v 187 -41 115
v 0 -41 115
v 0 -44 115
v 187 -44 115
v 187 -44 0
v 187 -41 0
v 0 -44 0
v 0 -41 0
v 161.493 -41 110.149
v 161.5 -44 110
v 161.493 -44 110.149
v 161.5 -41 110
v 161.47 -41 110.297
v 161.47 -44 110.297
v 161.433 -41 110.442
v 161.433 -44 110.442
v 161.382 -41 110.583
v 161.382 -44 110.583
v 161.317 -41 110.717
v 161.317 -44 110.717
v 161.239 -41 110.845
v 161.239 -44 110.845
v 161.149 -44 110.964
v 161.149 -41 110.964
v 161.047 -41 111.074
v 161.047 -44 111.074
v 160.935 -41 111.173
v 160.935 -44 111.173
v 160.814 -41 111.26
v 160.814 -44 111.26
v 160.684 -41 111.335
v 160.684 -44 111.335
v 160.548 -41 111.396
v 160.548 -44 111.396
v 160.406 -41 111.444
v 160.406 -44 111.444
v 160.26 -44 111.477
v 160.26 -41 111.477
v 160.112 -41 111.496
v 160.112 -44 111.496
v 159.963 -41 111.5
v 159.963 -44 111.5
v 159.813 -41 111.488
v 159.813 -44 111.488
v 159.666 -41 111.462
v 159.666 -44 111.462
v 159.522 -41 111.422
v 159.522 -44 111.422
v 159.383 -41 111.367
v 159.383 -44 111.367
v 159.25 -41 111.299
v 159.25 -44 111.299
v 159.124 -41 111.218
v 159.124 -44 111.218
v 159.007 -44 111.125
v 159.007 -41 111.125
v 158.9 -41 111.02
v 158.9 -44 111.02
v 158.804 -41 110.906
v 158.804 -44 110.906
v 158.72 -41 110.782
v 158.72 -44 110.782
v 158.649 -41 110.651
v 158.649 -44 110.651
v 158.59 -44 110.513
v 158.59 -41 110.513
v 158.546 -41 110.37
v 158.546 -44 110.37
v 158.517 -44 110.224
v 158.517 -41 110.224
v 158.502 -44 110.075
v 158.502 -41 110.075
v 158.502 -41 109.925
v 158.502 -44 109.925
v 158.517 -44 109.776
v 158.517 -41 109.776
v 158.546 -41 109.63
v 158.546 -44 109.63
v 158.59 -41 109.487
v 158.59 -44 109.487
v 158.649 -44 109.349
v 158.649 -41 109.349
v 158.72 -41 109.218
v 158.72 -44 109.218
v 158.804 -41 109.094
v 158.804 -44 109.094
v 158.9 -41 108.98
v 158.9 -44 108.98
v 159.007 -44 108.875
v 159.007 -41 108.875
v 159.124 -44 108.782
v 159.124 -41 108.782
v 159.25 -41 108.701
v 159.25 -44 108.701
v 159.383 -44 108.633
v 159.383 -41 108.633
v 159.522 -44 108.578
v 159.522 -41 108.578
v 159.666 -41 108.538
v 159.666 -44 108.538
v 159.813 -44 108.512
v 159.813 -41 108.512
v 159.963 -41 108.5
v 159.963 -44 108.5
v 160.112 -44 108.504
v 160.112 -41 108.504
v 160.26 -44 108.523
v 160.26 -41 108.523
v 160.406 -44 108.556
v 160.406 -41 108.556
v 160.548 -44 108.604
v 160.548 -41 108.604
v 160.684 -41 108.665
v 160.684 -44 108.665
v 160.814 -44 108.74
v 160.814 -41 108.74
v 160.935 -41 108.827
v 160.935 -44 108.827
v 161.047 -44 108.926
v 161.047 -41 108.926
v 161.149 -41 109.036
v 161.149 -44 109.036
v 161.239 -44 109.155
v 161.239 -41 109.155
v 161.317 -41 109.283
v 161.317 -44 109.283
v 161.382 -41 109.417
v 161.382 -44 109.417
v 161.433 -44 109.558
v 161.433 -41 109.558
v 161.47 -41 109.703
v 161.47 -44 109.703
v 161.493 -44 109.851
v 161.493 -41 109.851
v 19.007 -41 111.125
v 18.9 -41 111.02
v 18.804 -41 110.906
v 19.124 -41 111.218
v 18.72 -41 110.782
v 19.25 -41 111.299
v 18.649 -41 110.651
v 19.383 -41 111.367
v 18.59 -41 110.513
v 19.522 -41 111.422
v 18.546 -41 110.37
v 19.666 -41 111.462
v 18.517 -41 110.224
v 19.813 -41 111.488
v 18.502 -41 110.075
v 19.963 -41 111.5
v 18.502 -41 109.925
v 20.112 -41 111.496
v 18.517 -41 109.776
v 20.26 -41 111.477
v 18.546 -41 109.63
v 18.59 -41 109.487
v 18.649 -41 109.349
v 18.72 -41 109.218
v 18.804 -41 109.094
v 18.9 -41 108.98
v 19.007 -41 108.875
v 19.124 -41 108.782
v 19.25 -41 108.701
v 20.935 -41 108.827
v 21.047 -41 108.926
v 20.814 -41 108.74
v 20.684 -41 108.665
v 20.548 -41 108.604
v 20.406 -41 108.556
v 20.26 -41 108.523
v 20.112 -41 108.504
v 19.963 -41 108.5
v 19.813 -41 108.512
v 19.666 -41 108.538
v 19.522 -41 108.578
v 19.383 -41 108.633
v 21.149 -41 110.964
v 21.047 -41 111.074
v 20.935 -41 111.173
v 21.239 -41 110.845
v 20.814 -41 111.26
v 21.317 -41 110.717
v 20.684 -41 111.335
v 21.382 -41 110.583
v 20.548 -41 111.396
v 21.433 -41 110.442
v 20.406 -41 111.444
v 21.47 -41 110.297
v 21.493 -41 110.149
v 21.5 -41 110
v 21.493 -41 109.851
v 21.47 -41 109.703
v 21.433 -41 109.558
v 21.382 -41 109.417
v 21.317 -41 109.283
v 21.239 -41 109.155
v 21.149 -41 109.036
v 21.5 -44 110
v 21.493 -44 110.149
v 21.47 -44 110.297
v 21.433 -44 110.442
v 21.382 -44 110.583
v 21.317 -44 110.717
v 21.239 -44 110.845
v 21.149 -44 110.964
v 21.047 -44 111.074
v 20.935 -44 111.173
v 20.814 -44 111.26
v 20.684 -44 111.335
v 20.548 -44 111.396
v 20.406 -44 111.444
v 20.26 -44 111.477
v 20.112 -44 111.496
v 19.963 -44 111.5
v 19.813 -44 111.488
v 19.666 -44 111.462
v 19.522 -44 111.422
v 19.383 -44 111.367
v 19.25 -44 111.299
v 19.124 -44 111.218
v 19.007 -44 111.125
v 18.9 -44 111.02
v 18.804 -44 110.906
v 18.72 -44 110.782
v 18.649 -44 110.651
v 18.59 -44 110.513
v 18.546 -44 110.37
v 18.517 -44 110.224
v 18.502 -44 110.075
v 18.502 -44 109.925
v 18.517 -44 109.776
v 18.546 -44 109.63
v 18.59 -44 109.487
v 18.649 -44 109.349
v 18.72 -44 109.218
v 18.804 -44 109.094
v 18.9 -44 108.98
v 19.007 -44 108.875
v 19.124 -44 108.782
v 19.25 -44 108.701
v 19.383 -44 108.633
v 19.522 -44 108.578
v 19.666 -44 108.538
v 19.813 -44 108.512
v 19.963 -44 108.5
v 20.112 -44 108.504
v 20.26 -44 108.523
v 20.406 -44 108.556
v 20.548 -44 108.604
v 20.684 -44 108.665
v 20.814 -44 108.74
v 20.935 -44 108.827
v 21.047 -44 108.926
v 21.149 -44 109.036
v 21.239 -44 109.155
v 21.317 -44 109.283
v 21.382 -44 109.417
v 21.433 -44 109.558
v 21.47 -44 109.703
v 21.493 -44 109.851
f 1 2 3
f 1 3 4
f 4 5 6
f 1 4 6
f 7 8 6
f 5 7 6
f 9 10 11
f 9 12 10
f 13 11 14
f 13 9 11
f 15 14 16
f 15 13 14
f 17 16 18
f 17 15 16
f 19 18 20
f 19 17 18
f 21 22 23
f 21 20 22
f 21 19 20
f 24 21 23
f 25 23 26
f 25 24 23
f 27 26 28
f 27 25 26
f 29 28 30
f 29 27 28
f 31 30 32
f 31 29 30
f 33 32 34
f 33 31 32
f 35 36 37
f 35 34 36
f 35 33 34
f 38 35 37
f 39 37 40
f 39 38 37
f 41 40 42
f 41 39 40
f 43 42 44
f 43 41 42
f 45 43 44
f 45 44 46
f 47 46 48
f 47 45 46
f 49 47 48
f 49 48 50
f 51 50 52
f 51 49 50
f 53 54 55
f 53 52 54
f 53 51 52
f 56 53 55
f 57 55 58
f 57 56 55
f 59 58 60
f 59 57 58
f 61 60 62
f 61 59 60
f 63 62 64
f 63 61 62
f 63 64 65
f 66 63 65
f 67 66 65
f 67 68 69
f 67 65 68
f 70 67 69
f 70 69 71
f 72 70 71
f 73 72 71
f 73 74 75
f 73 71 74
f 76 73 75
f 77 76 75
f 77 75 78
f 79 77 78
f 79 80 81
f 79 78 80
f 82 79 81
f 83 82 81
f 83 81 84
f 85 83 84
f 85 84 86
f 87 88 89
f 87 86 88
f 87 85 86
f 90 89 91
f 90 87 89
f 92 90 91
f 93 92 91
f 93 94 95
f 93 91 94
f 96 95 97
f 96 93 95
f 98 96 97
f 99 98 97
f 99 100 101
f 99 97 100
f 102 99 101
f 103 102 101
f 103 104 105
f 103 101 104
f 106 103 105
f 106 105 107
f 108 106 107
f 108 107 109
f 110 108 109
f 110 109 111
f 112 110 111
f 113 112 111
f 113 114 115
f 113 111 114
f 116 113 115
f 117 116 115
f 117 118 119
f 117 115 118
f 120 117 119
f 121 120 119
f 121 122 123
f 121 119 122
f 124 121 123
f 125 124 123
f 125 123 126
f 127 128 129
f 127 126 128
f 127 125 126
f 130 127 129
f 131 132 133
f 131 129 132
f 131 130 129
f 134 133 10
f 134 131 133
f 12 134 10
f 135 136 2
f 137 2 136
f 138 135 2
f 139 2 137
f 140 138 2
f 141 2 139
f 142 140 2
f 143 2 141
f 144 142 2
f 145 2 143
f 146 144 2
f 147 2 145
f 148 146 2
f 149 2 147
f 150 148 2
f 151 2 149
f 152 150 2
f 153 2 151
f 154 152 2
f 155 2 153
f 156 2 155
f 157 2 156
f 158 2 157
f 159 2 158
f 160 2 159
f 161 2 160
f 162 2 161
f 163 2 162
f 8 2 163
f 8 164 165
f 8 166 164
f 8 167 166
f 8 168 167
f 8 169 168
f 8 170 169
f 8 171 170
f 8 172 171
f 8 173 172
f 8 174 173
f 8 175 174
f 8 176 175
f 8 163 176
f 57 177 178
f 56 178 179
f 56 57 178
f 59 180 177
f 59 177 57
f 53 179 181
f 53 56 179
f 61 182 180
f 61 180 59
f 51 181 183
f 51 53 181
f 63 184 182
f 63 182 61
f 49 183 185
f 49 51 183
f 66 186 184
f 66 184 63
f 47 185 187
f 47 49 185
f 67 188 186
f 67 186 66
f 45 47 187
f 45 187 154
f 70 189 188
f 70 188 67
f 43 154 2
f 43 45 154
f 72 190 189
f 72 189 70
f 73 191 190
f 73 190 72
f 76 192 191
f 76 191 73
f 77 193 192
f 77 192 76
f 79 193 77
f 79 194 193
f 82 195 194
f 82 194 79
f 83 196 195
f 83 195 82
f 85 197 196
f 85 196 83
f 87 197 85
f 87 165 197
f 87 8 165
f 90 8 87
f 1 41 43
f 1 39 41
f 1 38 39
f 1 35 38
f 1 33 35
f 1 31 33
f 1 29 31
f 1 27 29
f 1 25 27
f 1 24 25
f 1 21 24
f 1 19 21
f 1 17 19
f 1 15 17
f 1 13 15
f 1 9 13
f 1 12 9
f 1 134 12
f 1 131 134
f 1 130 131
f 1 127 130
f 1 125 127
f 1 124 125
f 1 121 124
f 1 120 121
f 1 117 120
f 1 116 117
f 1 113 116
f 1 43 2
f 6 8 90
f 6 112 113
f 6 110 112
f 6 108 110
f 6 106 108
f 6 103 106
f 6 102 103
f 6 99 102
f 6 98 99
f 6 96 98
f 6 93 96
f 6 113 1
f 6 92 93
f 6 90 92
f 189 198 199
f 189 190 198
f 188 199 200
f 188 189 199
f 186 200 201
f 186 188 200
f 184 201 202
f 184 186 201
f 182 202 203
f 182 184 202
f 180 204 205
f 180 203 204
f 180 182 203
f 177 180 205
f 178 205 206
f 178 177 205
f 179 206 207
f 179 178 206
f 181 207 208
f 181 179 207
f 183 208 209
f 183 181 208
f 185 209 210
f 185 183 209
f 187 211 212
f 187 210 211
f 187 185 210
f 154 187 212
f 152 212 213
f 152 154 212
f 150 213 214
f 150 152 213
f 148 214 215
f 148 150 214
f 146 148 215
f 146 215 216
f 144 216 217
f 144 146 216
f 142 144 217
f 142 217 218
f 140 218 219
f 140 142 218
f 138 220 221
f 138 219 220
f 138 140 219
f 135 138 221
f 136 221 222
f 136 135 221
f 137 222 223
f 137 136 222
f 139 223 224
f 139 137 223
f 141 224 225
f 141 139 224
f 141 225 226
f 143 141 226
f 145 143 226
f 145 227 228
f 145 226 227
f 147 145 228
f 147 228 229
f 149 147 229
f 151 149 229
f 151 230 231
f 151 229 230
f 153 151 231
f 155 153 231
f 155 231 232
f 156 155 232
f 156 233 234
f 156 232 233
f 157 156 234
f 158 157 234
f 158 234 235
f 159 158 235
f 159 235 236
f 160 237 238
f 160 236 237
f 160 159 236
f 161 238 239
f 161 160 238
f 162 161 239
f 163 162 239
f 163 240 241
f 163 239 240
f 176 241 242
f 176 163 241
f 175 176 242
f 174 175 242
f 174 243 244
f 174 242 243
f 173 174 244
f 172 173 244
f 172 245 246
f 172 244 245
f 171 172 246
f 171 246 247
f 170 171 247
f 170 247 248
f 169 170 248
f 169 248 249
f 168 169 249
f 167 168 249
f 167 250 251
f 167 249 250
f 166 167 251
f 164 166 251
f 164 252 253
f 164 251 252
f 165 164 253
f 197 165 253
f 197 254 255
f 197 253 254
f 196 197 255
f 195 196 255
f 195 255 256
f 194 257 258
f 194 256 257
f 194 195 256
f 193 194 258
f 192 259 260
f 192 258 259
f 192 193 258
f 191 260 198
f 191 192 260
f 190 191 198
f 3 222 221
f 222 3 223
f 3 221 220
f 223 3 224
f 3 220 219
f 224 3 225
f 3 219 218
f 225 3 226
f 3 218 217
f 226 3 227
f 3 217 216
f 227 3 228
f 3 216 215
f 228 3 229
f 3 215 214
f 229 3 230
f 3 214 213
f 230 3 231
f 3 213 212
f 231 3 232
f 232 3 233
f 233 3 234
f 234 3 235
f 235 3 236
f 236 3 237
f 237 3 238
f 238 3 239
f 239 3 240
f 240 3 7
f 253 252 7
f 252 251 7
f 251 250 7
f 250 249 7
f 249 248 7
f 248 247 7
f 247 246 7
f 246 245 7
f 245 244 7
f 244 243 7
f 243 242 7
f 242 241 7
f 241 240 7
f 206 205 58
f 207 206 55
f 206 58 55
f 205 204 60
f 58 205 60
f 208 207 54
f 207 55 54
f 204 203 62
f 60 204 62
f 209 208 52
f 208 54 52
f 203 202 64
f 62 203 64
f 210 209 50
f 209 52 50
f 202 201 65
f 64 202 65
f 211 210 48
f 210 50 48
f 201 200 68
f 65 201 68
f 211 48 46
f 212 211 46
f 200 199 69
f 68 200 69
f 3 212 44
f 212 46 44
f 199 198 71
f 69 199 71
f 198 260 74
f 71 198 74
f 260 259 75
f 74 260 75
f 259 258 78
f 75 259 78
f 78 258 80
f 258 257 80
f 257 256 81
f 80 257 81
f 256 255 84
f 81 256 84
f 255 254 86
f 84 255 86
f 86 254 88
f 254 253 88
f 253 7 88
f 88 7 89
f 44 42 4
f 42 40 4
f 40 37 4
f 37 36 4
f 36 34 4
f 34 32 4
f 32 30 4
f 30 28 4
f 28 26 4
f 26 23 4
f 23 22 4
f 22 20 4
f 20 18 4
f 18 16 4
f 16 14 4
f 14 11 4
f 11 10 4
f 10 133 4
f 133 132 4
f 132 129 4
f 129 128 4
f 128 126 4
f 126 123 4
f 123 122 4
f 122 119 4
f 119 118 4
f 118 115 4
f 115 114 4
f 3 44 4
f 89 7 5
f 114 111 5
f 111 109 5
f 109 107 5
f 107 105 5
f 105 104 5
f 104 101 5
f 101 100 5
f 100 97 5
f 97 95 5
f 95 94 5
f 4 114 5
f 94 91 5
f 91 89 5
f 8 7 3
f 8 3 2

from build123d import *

# Parameters (mm, degrees)
CYLINDER174_R          = 1.5
CYLINDER174_DEPTH      = 200
CYLINDER174_ROLL_ANGLE = 90
CYLINDER173_R          = 1.5
CYLINDER173_DEPTH      = 200
CYLINDER173_ROLL_ANGLE = 90
BOX089_W               = 187
BOX089_H               = 3
BOX089_DEPTH           = 115


with BuildPart() as varilla8y018:
    # Cylinder174 → Cylinder174 (new body)
    with BuildSketch(Plane.XY):
        Circle(CYLINDER174_R)
    extrude(amount=CYLINDER174_DEPTH)


with BuildPart() as varilla8y018_1:
    # Cylinder174 roll: moved
    add(varilla8y018.part.rotate(Axis((0, 0, 0), (1, 0, 0)), CYLINDER174_ROLL_ANGLE))


with BuildPart() as varilla8y018_2:
    # Cylinder174 placement: moved
    add(varilla8y018_1.part.moved(Location((160, 154, 110))))


with BuildPart() as varilla8y017:
    # Cylinder173 → Cylinder173 (new body)
    with BuildSketch(Plane.XY):
        Circle(CYLINDER173_R)
    extrude(amount=CYLINDER173_DEPTH)


with BuildPart() as varilla8y017_1:
    # Cylinder173 roll: moved
    add(varilla8y017.part.rotate(Axis((0, 0, 0), (1, 0, 0)), CYLINDER173_ROLL_ANGLE))


with BuildPart() as varilla8y017_2:
    # Cylinder173 placement: moved
    add(varilla8y017_1.part.moved(Location((20, 154, 110))))


with BuildPart() as plexi_orange:
    # Box089 → Box089 (new body)
    with BuildSketch(Plane(origin=(0, -44, 0), x_dir=(1, 0, 0), z_dir=(0, 0, 1))):
        with Locations((93.5, 1.5)):
            Rectangle(BOX089_W, BOX089_H)
    extrude(amount=BOX089_DEPTH)

    # Cut217: cut varilla8y017
    add(varilla8y017_2.part, mode=Mode.SUBTRACT)

    # Cut218: cut varilla8y018
    add(varilla8y018_2.part, mode=Mode.SUBTRACT)


solid = plexi_orange.part
